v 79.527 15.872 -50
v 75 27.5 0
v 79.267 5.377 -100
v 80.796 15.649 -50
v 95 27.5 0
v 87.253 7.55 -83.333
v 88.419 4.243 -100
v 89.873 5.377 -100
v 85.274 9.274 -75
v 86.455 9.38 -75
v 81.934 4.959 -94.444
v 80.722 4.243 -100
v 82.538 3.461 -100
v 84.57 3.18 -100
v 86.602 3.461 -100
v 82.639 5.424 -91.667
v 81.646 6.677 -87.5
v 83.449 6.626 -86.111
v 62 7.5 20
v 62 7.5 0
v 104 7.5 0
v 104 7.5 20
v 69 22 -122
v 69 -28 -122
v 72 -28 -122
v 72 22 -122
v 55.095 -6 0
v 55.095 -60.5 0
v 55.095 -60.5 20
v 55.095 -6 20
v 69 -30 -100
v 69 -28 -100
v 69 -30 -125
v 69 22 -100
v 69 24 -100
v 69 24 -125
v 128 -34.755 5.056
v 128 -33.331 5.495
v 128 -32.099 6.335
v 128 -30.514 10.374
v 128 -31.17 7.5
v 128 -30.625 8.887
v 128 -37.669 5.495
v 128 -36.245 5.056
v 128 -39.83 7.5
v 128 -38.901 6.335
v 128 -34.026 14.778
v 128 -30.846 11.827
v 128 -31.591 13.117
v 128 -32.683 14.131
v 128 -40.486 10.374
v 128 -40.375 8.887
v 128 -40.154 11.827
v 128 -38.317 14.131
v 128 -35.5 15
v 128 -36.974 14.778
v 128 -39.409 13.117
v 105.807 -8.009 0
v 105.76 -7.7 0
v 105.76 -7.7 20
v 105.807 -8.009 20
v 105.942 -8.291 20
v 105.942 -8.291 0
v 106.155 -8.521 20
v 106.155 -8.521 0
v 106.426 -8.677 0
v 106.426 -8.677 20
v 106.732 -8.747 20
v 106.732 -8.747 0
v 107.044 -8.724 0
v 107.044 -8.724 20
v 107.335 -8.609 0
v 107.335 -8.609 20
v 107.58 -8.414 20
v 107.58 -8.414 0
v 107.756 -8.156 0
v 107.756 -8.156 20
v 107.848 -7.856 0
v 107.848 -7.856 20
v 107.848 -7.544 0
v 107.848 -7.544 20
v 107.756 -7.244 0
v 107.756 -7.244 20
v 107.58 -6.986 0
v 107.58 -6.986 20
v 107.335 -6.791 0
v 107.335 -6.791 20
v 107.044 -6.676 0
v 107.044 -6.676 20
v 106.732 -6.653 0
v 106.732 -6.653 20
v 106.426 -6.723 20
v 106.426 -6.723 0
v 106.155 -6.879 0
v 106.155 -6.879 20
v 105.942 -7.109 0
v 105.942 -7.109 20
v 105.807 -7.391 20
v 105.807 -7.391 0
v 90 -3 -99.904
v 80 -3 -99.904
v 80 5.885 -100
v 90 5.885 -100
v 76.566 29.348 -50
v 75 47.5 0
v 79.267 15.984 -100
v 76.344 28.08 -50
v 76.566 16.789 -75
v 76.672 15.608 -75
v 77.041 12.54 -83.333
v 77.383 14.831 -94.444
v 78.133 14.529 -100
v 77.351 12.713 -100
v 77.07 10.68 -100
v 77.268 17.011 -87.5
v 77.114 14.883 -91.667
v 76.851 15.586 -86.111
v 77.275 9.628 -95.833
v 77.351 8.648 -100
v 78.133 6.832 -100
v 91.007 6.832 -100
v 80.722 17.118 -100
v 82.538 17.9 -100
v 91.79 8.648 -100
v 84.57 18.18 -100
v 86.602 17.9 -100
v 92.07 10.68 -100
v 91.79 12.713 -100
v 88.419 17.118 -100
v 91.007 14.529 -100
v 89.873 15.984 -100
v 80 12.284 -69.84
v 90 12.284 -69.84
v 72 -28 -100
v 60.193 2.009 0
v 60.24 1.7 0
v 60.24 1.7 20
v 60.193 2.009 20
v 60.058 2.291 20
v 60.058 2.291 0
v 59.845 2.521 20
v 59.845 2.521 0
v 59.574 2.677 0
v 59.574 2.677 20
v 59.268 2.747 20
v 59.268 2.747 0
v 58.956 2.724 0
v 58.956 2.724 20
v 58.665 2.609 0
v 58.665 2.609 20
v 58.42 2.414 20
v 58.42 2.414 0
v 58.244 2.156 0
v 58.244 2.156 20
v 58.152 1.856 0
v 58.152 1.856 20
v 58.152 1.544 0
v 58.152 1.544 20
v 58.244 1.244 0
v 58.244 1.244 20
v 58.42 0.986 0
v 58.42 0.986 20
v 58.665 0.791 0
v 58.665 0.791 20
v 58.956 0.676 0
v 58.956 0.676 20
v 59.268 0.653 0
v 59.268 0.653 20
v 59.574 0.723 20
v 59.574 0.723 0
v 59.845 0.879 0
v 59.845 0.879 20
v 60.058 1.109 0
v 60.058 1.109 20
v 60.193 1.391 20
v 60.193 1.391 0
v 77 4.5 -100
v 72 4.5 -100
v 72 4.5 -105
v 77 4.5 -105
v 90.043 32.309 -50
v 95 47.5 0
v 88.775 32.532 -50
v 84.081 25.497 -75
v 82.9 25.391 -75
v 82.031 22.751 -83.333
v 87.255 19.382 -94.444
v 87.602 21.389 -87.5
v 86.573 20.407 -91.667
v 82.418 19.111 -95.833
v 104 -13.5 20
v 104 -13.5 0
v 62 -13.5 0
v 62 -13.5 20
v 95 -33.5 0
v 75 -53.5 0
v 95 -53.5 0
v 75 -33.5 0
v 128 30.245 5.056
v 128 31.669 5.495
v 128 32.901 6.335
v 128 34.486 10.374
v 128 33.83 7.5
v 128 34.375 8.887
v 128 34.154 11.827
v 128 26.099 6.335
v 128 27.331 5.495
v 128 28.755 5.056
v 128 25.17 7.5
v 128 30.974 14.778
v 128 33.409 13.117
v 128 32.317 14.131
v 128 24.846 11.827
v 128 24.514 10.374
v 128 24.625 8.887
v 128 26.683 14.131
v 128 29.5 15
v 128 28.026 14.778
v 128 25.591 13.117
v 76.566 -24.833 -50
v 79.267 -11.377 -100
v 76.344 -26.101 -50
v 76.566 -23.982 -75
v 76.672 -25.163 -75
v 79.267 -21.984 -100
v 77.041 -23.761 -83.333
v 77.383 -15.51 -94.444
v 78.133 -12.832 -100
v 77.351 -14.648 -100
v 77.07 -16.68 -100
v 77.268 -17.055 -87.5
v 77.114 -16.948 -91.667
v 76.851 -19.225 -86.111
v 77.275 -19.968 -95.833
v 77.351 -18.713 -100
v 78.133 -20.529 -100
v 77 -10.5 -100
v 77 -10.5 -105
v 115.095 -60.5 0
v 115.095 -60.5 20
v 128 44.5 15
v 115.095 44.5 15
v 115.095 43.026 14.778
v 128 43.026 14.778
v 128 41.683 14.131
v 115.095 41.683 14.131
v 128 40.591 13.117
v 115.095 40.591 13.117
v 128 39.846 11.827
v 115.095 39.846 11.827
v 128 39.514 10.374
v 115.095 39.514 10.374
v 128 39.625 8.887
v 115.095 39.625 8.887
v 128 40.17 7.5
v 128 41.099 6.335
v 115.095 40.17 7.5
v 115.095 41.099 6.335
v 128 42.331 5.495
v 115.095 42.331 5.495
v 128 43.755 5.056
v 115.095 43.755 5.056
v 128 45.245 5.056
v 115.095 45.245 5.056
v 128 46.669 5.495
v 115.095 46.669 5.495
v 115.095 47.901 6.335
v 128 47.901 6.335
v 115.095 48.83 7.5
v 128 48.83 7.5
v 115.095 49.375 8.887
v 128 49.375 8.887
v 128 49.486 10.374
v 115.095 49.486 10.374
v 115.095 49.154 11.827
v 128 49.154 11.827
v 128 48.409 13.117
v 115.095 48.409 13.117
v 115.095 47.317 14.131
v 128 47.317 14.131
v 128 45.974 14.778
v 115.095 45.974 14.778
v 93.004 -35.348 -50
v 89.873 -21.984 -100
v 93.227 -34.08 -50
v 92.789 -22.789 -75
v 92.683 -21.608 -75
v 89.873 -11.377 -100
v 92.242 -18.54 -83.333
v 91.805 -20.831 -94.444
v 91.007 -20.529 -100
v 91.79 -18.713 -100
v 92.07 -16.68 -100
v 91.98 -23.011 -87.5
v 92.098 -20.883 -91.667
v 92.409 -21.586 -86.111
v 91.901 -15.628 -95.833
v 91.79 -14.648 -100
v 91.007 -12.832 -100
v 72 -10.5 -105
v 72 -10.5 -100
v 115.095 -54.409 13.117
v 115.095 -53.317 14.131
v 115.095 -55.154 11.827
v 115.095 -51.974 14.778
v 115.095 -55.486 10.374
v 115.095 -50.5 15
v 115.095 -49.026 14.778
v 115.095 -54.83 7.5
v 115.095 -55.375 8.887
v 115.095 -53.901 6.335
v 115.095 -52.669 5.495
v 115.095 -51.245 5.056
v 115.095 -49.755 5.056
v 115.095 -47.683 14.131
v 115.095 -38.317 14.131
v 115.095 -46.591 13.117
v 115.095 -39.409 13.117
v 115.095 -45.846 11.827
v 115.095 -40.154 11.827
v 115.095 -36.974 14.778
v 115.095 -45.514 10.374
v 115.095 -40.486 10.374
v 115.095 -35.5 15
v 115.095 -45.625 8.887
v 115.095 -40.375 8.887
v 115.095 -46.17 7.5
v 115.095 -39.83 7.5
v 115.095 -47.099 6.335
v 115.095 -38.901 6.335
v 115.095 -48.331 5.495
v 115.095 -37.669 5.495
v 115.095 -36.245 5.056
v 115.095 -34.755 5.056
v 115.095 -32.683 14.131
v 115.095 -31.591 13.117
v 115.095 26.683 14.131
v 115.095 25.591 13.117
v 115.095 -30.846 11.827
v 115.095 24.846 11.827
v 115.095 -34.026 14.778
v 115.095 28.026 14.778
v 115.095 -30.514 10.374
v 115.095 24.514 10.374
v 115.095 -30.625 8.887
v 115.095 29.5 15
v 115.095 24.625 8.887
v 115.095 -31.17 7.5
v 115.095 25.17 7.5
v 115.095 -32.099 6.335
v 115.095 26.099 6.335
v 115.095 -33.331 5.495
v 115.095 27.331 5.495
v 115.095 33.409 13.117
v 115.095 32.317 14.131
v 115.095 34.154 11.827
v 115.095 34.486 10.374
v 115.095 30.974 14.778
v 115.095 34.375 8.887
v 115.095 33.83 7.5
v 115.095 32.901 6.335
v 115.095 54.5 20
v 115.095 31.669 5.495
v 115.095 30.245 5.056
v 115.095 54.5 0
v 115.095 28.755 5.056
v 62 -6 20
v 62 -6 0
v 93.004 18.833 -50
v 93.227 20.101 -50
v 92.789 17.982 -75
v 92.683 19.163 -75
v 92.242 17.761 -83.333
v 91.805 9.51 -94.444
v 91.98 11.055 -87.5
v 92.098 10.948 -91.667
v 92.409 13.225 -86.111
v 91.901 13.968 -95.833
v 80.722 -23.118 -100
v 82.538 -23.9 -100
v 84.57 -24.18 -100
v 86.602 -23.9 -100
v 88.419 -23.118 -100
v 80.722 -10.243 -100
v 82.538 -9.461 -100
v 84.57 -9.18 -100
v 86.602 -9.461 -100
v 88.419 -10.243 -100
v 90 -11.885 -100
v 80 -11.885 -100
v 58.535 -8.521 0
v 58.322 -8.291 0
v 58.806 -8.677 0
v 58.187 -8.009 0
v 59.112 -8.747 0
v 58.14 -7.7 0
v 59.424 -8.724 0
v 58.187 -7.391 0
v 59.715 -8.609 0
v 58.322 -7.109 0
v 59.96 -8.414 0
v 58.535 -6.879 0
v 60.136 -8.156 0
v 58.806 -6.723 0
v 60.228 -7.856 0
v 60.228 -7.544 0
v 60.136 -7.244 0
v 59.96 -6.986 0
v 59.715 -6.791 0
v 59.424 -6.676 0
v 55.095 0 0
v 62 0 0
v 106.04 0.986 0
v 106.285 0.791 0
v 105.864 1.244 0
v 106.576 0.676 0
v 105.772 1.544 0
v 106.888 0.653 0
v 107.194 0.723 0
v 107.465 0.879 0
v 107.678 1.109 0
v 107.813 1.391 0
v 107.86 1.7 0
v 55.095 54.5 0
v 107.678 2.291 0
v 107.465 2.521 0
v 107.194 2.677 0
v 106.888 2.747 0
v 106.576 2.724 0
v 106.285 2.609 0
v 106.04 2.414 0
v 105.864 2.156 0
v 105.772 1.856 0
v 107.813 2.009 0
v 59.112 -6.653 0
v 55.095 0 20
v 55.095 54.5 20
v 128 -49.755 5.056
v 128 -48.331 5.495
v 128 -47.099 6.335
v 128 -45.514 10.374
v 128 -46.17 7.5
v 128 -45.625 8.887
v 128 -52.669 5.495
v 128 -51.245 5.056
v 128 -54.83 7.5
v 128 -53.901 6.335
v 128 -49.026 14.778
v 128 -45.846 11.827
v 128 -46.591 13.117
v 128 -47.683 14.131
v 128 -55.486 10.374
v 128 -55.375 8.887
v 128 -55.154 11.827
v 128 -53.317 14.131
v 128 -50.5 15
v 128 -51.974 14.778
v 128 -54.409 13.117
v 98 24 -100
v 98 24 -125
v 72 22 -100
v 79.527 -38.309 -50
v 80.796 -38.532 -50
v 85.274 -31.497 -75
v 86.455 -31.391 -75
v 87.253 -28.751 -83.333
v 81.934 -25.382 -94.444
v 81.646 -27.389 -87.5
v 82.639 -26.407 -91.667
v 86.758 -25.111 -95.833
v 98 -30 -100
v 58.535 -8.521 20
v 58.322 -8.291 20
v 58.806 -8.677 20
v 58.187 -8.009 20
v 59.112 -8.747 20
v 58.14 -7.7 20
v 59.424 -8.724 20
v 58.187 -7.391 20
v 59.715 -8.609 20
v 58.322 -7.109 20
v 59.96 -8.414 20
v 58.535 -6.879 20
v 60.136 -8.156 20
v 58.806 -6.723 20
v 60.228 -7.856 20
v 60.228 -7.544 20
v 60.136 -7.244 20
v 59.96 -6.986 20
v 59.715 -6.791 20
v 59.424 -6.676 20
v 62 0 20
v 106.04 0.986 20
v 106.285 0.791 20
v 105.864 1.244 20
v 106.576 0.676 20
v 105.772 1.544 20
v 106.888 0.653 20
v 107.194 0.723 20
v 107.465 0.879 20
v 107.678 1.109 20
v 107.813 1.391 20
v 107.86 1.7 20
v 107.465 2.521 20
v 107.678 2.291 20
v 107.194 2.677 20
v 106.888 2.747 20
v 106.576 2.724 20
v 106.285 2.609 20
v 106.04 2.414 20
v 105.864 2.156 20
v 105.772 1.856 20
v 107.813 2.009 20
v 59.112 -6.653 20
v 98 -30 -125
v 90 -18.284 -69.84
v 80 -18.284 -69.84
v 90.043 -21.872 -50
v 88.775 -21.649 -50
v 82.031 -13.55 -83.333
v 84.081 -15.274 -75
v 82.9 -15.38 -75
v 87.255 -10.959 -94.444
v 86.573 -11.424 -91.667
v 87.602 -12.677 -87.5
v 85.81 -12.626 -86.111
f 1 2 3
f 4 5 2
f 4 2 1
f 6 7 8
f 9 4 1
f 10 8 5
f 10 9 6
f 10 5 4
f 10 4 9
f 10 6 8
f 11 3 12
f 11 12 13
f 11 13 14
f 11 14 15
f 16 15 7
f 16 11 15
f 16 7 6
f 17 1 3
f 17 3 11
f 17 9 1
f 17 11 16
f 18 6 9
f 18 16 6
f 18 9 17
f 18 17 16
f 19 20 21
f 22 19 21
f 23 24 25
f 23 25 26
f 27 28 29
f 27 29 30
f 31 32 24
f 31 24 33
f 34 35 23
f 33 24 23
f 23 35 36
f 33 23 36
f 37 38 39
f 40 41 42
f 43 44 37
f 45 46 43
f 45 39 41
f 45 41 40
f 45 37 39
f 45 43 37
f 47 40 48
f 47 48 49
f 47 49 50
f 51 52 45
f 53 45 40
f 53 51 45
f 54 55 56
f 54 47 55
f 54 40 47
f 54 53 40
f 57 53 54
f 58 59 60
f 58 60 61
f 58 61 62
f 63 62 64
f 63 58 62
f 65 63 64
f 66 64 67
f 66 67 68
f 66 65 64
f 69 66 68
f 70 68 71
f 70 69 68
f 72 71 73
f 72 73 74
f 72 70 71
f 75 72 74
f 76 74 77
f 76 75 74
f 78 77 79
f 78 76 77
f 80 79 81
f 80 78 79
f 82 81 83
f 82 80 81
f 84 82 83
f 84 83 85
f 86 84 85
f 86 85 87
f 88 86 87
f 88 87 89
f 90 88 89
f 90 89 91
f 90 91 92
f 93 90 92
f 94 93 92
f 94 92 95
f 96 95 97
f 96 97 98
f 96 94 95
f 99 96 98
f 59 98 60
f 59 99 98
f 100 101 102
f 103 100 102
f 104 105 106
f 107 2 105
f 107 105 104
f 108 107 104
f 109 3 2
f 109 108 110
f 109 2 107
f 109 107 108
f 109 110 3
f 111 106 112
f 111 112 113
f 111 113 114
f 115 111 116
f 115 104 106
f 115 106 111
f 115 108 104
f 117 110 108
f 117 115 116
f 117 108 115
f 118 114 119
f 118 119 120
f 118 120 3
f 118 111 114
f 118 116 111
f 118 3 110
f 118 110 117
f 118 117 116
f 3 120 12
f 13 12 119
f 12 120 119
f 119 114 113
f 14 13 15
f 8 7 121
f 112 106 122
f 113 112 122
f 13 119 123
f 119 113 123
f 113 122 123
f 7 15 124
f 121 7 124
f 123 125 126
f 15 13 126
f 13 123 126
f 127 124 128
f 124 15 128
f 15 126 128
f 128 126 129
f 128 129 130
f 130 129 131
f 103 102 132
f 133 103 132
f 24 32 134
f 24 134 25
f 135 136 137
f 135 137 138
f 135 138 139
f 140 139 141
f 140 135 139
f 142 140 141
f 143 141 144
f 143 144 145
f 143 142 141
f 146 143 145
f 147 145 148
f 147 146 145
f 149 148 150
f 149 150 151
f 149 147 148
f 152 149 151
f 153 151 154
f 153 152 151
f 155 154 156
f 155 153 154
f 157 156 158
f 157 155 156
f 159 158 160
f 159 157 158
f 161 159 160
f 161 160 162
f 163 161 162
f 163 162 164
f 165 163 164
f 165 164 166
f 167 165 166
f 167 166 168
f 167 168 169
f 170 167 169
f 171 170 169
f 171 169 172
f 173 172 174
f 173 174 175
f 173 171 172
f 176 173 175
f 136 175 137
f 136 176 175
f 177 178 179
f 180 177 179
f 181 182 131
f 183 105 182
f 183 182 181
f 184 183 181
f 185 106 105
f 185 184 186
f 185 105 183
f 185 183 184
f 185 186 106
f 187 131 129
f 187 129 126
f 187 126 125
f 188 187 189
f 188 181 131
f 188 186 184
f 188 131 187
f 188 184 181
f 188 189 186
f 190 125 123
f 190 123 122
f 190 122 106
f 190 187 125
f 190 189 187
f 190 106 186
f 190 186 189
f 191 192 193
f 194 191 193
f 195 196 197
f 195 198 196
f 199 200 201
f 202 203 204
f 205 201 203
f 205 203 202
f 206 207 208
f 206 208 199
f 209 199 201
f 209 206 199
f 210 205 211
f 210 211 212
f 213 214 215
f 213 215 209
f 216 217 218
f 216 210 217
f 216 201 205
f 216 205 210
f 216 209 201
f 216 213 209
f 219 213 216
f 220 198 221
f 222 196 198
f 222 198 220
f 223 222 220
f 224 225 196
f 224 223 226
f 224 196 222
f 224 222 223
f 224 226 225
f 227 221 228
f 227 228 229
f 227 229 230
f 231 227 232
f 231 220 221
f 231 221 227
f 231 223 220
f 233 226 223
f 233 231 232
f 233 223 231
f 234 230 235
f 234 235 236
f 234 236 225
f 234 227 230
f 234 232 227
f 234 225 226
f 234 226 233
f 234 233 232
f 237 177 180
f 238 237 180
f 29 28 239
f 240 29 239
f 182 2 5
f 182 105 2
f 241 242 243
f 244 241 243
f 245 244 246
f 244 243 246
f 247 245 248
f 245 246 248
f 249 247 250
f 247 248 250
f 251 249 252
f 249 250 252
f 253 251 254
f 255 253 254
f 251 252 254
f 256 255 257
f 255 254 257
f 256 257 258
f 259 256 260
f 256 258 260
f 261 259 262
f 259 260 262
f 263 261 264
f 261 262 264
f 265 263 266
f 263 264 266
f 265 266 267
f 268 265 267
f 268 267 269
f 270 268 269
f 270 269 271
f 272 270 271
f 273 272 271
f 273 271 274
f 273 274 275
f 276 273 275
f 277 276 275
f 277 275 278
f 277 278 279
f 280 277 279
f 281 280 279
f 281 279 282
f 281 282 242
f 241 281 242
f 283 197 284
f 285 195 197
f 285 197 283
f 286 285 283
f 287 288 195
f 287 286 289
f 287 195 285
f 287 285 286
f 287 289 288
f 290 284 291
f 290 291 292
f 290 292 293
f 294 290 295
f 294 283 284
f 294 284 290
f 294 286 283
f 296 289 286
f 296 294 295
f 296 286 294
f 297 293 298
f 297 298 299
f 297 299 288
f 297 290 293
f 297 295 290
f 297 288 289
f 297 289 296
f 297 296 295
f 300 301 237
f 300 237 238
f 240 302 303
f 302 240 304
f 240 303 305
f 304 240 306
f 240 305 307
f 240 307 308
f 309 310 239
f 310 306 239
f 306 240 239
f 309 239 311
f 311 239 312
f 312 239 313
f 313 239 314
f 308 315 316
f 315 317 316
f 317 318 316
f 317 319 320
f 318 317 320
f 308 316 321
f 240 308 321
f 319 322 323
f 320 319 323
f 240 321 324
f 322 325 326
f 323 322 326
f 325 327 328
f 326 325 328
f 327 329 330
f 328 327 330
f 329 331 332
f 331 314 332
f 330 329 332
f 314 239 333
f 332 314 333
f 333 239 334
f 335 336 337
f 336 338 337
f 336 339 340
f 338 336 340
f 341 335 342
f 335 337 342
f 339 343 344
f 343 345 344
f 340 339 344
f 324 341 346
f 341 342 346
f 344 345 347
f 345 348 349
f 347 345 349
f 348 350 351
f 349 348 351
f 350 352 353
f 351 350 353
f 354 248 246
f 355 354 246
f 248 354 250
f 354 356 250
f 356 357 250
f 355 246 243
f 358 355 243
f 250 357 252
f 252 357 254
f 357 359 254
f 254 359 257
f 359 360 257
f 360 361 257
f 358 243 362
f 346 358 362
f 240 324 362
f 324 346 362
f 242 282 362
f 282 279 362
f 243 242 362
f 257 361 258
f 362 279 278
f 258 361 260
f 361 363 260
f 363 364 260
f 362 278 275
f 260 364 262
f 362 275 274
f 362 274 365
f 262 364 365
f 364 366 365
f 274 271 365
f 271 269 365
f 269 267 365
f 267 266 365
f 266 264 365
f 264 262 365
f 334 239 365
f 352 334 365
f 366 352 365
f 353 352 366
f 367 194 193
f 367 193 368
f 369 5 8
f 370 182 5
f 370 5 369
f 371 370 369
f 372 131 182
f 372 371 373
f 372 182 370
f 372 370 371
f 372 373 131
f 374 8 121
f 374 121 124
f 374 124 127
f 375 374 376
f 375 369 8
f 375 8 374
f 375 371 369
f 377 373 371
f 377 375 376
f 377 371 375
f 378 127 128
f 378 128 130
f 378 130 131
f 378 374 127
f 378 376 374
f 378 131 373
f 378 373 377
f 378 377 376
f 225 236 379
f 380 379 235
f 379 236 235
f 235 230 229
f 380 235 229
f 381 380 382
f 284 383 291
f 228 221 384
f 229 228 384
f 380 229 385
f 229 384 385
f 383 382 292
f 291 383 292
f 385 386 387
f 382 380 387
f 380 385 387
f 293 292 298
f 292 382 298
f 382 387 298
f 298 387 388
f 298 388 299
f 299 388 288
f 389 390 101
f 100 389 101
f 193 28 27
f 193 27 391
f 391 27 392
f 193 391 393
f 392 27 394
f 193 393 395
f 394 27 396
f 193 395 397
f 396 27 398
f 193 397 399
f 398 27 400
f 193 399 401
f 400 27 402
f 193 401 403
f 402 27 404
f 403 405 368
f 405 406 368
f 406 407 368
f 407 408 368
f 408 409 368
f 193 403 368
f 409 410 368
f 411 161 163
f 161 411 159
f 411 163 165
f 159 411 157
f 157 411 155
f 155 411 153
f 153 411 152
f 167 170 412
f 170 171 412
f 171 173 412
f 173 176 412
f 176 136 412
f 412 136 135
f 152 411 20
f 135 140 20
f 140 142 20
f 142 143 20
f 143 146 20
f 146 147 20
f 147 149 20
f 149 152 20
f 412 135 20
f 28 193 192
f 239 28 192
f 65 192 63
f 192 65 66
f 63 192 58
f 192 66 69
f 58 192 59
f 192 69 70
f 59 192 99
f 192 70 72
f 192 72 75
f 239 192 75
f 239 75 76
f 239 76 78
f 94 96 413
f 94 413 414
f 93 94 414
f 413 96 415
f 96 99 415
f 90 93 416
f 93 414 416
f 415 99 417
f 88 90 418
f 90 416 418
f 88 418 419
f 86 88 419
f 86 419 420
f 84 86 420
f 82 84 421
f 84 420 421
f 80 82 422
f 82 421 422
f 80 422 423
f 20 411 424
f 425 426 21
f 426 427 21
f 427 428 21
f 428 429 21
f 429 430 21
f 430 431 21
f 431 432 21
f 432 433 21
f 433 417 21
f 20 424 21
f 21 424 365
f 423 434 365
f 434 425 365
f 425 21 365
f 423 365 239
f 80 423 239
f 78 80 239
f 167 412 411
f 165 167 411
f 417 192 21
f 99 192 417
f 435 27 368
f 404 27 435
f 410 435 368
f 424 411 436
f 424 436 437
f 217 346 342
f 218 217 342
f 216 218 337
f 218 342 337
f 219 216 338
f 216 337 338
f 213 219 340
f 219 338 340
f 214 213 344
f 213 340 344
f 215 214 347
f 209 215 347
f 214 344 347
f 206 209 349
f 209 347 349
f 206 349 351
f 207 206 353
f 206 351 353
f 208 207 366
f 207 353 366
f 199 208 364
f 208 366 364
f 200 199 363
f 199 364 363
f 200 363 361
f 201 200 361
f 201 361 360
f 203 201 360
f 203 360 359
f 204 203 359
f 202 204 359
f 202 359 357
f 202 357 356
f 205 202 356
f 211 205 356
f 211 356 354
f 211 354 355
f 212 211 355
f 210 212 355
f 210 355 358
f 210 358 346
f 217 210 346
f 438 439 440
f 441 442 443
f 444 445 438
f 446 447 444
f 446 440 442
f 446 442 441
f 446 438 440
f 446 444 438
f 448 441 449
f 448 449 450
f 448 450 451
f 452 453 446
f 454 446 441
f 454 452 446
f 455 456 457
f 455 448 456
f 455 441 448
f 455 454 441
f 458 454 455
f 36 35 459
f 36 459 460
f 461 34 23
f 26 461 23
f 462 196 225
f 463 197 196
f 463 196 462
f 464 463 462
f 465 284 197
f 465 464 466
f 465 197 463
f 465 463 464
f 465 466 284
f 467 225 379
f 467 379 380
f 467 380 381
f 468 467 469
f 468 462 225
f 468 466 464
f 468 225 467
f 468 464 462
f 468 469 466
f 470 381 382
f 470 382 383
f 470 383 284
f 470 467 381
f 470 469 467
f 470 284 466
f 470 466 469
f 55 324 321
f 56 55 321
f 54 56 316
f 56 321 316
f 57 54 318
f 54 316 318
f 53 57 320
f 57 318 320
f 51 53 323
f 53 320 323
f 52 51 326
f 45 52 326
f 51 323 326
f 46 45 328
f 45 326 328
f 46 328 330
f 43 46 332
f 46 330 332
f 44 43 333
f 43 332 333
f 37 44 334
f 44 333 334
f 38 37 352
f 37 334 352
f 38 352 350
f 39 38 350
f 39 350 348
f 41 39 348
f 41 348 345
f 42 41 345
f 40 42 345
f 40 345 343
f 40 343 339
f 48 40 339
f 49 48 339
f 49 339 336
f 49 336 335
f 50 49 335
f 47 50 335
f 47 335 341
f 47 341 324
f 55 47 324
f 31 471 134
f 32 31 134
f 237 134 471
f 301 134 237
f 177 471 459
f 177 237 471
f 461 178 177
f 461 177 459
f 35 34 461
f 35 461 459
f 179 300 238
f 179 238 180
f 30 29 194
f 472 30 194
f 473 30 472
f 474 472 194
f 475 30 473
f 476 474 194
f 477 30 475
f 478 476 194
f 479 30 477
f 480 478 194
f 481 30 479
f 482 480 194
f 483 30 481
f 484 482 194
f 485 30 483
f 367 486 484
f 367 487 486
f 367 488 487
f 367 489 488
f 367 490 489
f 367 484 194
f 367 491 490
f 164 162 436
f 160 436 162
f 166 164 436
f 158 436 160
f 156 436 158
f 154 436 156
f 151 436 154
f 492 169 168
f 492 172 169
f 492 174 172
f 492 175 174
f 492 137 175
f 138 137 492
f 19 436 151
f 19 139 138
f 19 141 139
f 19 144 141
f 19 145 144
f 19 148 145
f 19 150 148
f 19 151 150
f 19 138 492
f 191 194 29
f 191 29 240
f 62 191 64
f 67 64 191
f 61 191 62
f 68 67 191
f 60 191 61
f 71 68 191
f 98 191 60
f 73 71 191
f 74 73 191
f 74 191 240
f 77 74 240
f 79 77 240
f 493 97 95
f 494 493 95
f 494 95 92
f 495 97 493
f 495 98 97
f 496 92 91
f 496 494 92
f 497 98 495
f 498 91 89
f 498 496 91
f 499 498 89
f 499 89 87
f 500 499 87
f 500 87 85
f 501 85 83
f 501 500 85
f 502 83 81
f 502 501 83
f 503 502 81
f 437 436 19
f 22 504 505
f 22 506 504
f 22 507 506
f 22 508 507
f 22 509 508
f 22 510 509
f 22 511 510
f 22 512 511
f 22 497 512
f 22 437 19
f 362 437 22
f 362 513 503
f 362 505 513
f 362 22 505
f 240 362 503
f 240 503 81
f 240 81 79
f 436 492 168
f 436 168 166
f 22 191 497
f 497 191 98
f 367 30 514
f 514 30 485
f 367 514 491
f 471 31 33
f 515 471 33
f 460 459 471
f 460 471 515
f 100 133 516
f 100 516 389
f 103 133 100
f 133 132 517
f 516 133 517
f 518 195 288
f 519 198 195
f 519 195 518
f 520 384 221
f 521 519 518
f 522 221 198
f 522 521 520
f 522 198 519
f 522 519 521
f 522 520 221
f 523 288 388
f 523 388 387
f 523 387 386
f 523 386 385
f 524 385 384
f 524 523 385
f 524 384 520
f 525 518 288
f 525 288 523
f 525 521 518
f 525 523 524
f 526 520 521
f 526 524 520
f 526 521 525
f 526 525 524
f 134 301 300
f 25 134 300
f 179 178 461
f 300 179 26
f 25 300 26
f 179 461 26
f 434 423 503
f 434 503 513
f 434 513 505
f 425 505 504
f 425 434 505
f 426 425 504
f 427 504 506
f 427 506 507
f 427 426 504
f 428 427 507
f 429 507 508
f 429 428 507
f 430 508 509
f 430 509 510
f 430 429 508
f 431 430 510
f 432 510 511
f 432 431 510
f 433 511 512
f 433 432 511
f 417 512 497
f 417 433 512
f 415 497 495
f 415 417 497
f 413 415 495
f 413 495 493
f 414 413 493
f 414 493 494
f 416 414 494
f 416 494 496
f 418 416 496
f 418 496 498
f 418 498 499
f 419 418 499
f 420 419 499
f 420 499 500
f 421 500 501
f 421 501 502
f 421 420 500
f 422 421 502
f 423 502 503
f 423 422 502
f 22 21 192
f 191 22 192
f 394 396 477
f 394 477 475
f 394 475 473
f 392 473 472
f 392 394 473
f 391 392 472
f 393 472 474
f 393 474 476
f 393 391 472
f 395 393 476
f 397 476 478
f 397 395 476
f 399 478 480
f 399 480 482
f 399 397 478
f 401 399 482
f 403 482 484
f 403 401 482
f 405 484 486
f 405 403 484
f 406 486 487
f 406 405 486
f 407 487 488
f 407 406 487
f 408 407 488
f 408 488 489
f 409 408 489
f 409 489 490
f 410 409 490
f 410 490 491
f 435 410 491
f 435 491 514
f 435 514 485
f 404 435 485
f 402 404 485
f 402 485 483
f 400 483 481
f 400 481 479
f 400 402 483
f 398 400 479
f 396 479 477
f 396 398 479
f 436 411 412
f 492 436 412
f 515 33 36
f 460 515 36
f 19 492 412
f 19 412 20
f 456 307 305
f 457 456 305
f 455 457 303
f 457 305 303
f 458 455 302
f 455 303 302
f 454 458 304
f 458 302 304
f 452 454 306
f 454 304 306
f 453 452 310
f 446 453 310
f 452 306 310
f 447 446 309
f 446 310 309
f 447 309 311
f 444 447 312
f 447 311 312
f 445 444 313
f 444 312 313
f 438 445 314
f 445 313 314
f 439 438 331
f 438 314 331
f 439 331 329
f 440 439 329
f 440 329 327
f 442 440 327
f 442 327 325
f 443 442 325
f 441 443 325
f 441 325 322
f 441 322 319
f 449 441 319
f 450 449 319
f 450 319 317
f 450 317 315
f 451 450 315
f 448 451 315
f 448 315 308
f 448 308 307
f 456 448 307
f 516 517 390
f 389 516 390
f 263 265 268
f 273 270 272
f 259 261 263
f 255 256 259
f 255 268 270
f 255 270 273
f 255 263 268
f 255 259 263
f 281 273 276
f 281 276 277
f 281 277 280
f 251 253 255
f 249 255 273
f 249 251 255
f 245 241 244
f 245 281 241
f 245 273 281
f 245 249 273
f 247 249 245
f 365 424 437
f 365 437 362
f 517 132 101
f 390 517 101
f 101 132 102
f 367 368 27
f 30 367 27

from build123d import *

# Parameters (mm, degrees)
SKETCH_5_W            = 60
SKETCH_5_H            = 115
EXTRUDE_2_DEPTH       = 20
SKETCH_1_R            = 1.05
CUT_EXTRUDE_4_DEPTH   = 20
SKETCH_6_R            = 5
EXTRUDE_3_DEPTH       = 13
EXTRUDE_6_DEPTH       = 3
EXTRUDE_6_DEPTH_BACK  = 26
SKETCH_13_W           = 25
SKETCH_13_H           = 54
SKETCH_16_W           = 22
SKETCH_16_H           = 50
CUT_EXTRUDE_9_DEPTH   = 3
SKETCH_17_W           = 5
SKETCH_17_H           = 15
CUT_EXTRUDE_10_DEPTH  = 8
EXTRUDE_13_DEPTH      = 5
EXTRUDE_13_DEPTH_BACK = 5


with BuildPart() as part:
    # 草圖5 → 填料-伸長2 (new body)
    with BuildSketch(Plane.XY):
        with Locations((85.095319229, -3)):
            Rectangle(SKETCH_5_W, SKETCH_5_H)
    extrude(amount=EXTRUDE_2_DEPTH)

    # 草圖1 → 除料-伸長4 (cut)
    with BuildSketch(Plane.XY):
        with Locations((59.19, 1.7)):
            Circle(SKETCH_1_R)
        with Locations((106.81, 1.7)):
            Circle(SKETCH_1_R)
        with Locations(Location((106.81, -7.7, 0), (0, 0, 180))):
            Circle(SKETCH_1_R)
        with Locations(Location((59.19, -7.7, 0), (0, 0, 180))):
            Circle(SKETCH_1_R)
        Polygon((55, -3), (55, 0), (62, 0), (62, 7.5), (104, 7.5), (104, -13.5), (62, -13.5), (62, -6), (55, -6), align=None)
    extrude(amount=CUT_EXTRUDE_4_DEPTH, mode=Mode.SUBTRACT)

    # 草圖6 → 填料-伸長3 (add)
    with BuildSketch(Plane(origin=(115, 0, 0), x_dir=(0, 0, -1), z_dir=(1, 0, 0))):
        with Locations(Location((-10, 44.5, 0), (0, 0, 180))):
            Circle(SKETCH_6_R)
        with Locations(Location((-10, 29.5, 0), (0, 0, 180))):
            Circle(SKETCH_6_R)
        with Locations(Location((-10, -35.5, 0), (0, 0, 180))):
            Circle(SKETCH_6_R)
        with Locations(Location((-10, -50.5, 0), (0, 0, 180))):
            Circle(SKETCH_6_R)
    extrude(amount=EXTRUDE_3_DEPTH)


with BuildPart() as body_2:
    # 草圖13 → 填料-伸長6 (new, two sides: drawn at the far end of the back side and taken through both)
    with BuildSketch(Plane(origin=(95, 0, 0), x_dir=(0, 0, -1), z_dir=(1, 0, 0)).offset(-EXTRUDE_6_DEPTH_BACK)):
        with Locations((112.5, -3)):
            Rectangle(SKETCH_13_W, SKETCH_13_H)
    extrude(amount=EXTRUDE_6_DEPTH + EXTRUDE_6_DEPTH_BACK)

    # 草圖16 → 除料-伸長9 (cut)
    with BuildSketch(Plane(origin=(69, 0, 0), x_dir=(0, 0, -1), z_dir=(1, 0, 0))):
        with Locations((111, -3)):
            Rectangle(SKETCH_16_W, SKETCH_16_H)
    extrude(amount=CUT_EXTRUDE_9_DEPTH, mode=Mode.SUBTRACT)

    # 草圖17 → 除料-伸長10 (cut)
    with BuildSketch(Plane(origin=(69, 0, 0), x_dir=(0, 0, -1), z_dir=(1, 0, 0))):
        with Locations((102.5, -3)):
            Rectangle(SKETCH_17_W, SKETCH_17_H)
    extrude(amount=CUT_EXTRUDE_10_DEPTH, mode=Mode.SUBTRACT)


with BuildPart() as body_3:
    # 草圖21 → 填料-伸長13 (new, two sides: drawn at the far end of the back side and taken through both)
    with BuildSketch(Plane(origin=(85, 0, 0), x_dir=(0, 0, -1), z_dir=(1, 0, 0)).offset(-EXTRUDE_13_DEPTH_BACK)):
        Polygon((69.839876567, 12.283695651), (69.839876567, -18.283695651), (100, -11.88497246), (99.903514788, -3), (100, 5.88497246), align=None)
    extrude(amount=EXTRUDE_13_DEPTH + EXTRUDE_13_DEPTH_BACK)


with BuildPart() as body_4:
    # Knit 1: read off the stored shape, not the designer's step
    # Knit 1: loft between two sections, ruled curve by curve
    knit_1_from = [
        Edge.make_bspline([(79.266895317, 5.377196179, -100), (79.579395317, 5.064696179, -100), (79.931362244, 4.768290315, -100), (80.709511323, 4.233165726, -100), (81.135733214, 3.994620259, -100), (82.046998926, 3.600245646, -100), (82.531971403, 3.444609801, -100), (83.534778832, 3.234670337, -100), (84.052429223, 3.180497037, -100), (85.087963129, 3.180497037, -100), (85.60561352, 3.234670337, -100), (86.608420949, 3.444609801, -100), (87.093393426, 3.600245646, -100), (88.004659138, 3.994620259, -100), (88.430881029, 4.233165726, -100), (89.209030109, 4.768290315, -100), (89.560997035, 5.064696179, -100), (89.873497035, 5.377196179, -100)], [0, 0, 0, 0, 0.125, 0.125, 0.25, 0.25, 0.375, 0.375, 0.5, 0.5, 0.625, 0.625, 0.75, 0.75, 0.875, 0.875, 1, 1, 1, 1], 3),
        Edge.make_bspline([(89.873497035, 5.377196179, -100), (90.185997035, 5.689696179, -100), (90.482402899, 6.041663105, -100), (91.017527488, 6.819812184, -100), (91.256072955, 7.246034075, -100), (91.650447568, 8.157299787, -100), (91.806083413, 8.642272265, -100), (92.016022877, 9.645079694, -100), (92.070196176, 10.162730084, -100), (92.070196176, 11.19826399, -100), (92.016022877, 11.715914381, -100), (91.806083413, 12.71872181, -100), (91.650447568, 13.203694288, -100), (91.256072955, 14.11496, -100), (91.017527488, 14.541181891, -100), (90.482402899, 15.31933097, -100), (90.185997035, 15.671297896, -100), (89.873497035, 15.983797896, -100)], [0, 0, 0, 0, 0.125, 0.125, 0.25, 0.25, 0.375, 0.375, 0.5, 0.5, 0.625, 0.625, 0.75, 0.75, 0.875, 0.875, 1, 1, 1, 1], 3),
        Edge.make_bspline([(79.266895317, 15.983797896, -100), (78.954395317, 15.671297896, -100), (78.657989454, 15.31933097, -100), (78.122864864, 14.541181891, -100), (77.884319398, 14.11496, -100), (77.489944785, 13.203694288, -100), (77.334308939, 12.71872181, -100), (77.124369476, 11.715914381, -100), (77.070196176, 11.19826399, -100), (77.070196176, 10.162730084, -100), (77.124369476, 9.645079694, -100), (77.334308939, 8.642272265, -100), (77.489944785, 8.157299787, -100), (77.884319398, 7.246034075, -100), (78.122864864, 6.819812184, -100), (78.657989454, 6.041663105, -100), (78.954395317, 5.689696179, -100), (79.266895317, 5.377196179, -100)], [0, 0, 0, 0, 0.125, 0.125, 0.25, 0.25, 0.375, 0.375, 0.5, 0.5, 0.625, 0.625, 0.75, 0.75, 0.875, 0.875, 1, 1, 1, 1], 3),
        Edge.make_bspline([(89.873497035, 15.983797896, -100), (89.560997035, 16.296297896, -100), (89.209030109, 16.59270376, -100), (88.430881029, 17.127828349, -100), (88.004659138, 17.366373816, -100), (87.093393426, 17.760748429, -100), (86.608420949, 17.916384274, -100), (85.60561352, 18.126323738, -100), (85.087963129, 18.180497037, -100), (84.052429223, 18.180497037, -100), (83.534778832, 18.126323738, -100), (82.531971403, 17.916384274, -100), (82.046998926, 17.760748429, -100), (81.135733214, 17.366373816, -100), (80.709511323, 17.127828349, -100), (79.931362244, 16.59270376, -100), (79.579395317, 16.296297896, -100), (79.266895317, 15.983797896, -100)], [0, 0, 0, 0, 0.125, 0.125, 0.25, 0.25, 0.375, 0.375, 0.5, 0.5, 0.625, 0.625, 0.75, 0.75, 0.875, 0.875, 1, 1, 1, 1], 3),
    ]
    knit_1_to = [
        Edge.make_bspline([(75, 27.5, 0), (75.833333333, 27.5, 0), (76.666666667, 27.5, 0), (78.333333333, 27.5, 0), (79.166666667, 27.5, 0), (80.833333333, 27.5, 0), (81.666666667, 27.5, 0), (83.333333333, 27.5, 0), (84.166666667, 27.5, 0), (85.833333333, 27.5, 0), (86.666666667, 27.5, 0), (88.333333333, 27.5, 0), (89.166666667, 27.5, 0), (90.833333333, 27.5, 0), (91.666666667, 27.5, 0), (93.333333333, 27.5, 0), (94.166666667, 27.5, 0), (95, 27.5, 0)], [0, 0, 0, 0, 0.125, 0.125, 0.25, 0.25, 0.375, 0.375, 0.5, 0.5, 0.625, 0.625, 0.75, 0.75, 0.875, 0.875, 1, 1, 1, 1], 3),
        Edge.make_bspline([(95, 27.5, 0), (95, 28.333333333, 0), (95, 29.166666667, 0), (95, 30.833333333, 0), (95, 31.666666667, 0), (95, 33.333333333, 0), (95, 34.166666667, 0), (95, 35.833333333, 0), (95, 36.666666667, 0), (95, 38.333333333, 0), (95, 39.166666667, 0), (95, 40.833333333, 0), (95, 41.666666667, 0), (95, 43.333333333, 0), (95, 44.166666667, 0), (95, 45.833333333, 0), (95, 46.666666667, 0), (95, 47.5, 0)], [0, 0, 0, 0, 0.125, 0.125, 0.25, 0.25, 0.375, 0.375, 0.5, 0.5, 0.625, 0.625, 0.75, 0.75, 0.875, 0.875, 1, 1, 1, 1], 3),
        Edge.make_bspline([(75, 47.5, 0), (75, 46.666666667, 0), (75, 45.833333333, 0), (75, 44.166666667, 0), (75, 43.333333333, 0), (75, 41.666666667, 0), (75, 40.833333333, 0), (75, 39.166666667, 0), (75, 38.333333333, 0), (75, 36.666666667, 0), (75, 35.833333333, 0), (75, 34.166666667, 0), (75, 33.333333333, 0), (75, 31.666666667, 0), (75, 30.833333333, 0), (75, 29.166666667, 0), (75, 28.333333333, 0), (75, 27.5, 0)], [0, 0, 0, 0, 0.125, 0.125, 0.25, 0.25, 0.375, 0.375, 0.5, 0.5, 0.625, 0.625, 0.75, 0.75, 0.875, 0.875, 1, 1, 1, 1], 3),
        Edge.make_bspline([(95, 47.5, 0), (94.166666667, 47.5, 0), (93.333333333, 47.5, 0), (91.666666667, 47.5, 0), (90.833333333, 47.5, 0), (89.166666667, 47.5, 0), (88.333333333, 47.5, 0), (86.666666667, 47.5, 0), (85.833333333, 47.5, 0), (84.166666667, 47.5, 0), (83.333333333, 47.5, 0), (81.666666667, 47.5, 0), (80.833333333, 47.5, 0), (79.166666667, 47.5, 0), (78.333333333, 47.5, 0), (76.666666667, 47.5, 0), (75.833333333, 47.5, 0), (75, 47.5, 0)], [0, 0, 0, 0, 0.125, 0.125, 0.25, 0.25, 0.375, 0.375, 0.5, 0.5, 0.625, 0.625, 0.75, 0.75, 0.875, 0.875, 1, 1, 1, 1], 3),
    ]
    knit_1 = Solid(Shell([*[Face.make_surface_from_curves(knit_1_from[k], knit_1_to[k]) for k in range(4)], Face(Wire(knit_1_from)), Face(Wire(knit_1_to))]))
    add(knit_1)


with BuildPart() as body_5:
    # Knit 2: read off the stored shape, not the designer's step
    # Knit 2: loft between two sections, ruled curve by curve
    knit_2_from = [
        Edge.make_bspline([(79.266895317, -21.983797896, -100), (79.579395317, -22.296297896, -100), (79.931362244, -22.59270376, -100), (80.709511323, -23.127828349, -100), (81.135733214, -23.366373816, -100), (82.046998926, -23.760748429, -100), (82.531971403, -23.916384274, -100), (83.534778832, -24.126323738, -100), (84.052429223, -24.180497037, -100), (85.087963129, -24.180497037, -100), (85.60561352, -24.126323738, -100), (86.608420949, -23.916384274, -100), (87.093393426, -23.760748429, -100), (88.004659138, -23.366373816, -100), (88.430881029, -23.127828349, -100), (89.209030109, -22.59270376, -100), (89.560997035, -22.296297896, -100), (89.873497035, -21.983797896, -100)], [0, 0, 0, 0, 0.125, 0.125, 0.25, 0.25, 0.375, 0.375, 0.5, 0.5, 0.625, 0.625, 0.75, 0.75, 0.875, 0.875, 1, 1, 1, 1], 3),
        Edge.make_bspline([(89.873497035, -21.983797896, -100), (90.185997035, -21.671297896, -100), (90.482402899, -21.31933097, -100), (91.017527488, -20.541181891, -100), (91.256072955, -20.11496, -100), (91.650447568, -19.203694288, -100), (91.806083413, -18.71872181, -100), (92.016022877, -17.715914381, -100), (92.070196176, -17.19826399, -100), (92.070196176, -16.162730084, -100), (92.016022877, -15.645079694, -100), (91.806083413, -14.642272265, -100), (91.650447568, -14.157299787, -100), (91.256072955, -13.246034075, -100), (91.017527488, -12.819812184, -100), (90.482402899, -12.041663105, -100), (90.185997035, -11.689696179, -100), (89.873497035, -11.377196179, -100)], [0, 0, 0, 0, 0.125, 0.125, 0.25, 0.25, 0.375, 0.375, 0.5, 0.5, 0.625, 0.625, 0.75, 0.75, 0.875, 0.875, 1, 1, 1, 1], 3),
        Edge.make_bspline([(79.266895317, -11.377196179, -100), (78.954395317, -11.689696179, -100), (78.657989454, -12.041663105, -100), (78.122864864, -12.819812184, -100), (77.884319398, -13.246034075, -100), (77.489944785, -14.157299787, -100), (77.334308939, -14.642272265, -100), (77.124369476, -15.645079694, -100), (77.070196176, -16.162730084, -100), (77.070196176, -17.19826399, -100), (77.124369476, -17.715914381, -100), (77.334308939, -18.71872181, -100), (77.489944785, -19.203694288, -100), (77.884319398, -20.11496, -100), (78.122864864, -20.541181891, -100), (78.657989454, -21.31933097, -100), (78.954395317, -21.671297896, -100), (79.266895317, -21.983797896, -100)], [0, 0, 0, 0, 0.125, 0.125, 0.25, 0.25, 0.375, 0.375, 0.5, 0.5, 0.625, 0.625, 0.75, 0.75, 0.875, 0.875, 1, 1, 1, 1], 3),
        Edge.make_bspline([(89.873497035, -11.377196179, -100), (89.560997035, -11.064696179, -100), (89.209030109, -10.768290315, -100), (88.430881029, -10.233165726, -100), (88.004659138, -9.994620259, -100), (87.093393426, -9.600245646, -100), (86.608420949, -9.444609801, -100), (85.60561352, -9.234670337, -100), (85.087963129, -9.180497037, -100), (84.052429223, -9.180497037, -100), (83.534778832, -9.234670337, -100), (82.531971403, -9.444609801, -100), (82.046998926, -9.600245646, -100), (81.135733214, -9.994620259, -100), (80.709511323, -10.233165726, -100), (79.931362244, -10.768290315, -100), (79.579395317, -11.064696179, -100), (79.266895317, -11.377196179, -100)], [0, 0, 0, 0, 0.125, 0.125, 0.25, 0.25, 0.375, 0.375, 0.5, 0.5, 0.625, 0.625, 0.75, 0.75, 0.875, 0.875, 1, 1, 1, 1], 3),
    ]
    knit_2_to = [
        Edge.make_bspline([(75, -53.5, 0), (75.833333333, -53.5, 0), (76.666666667, -53.5, 0), (78.333333333, -53.5, 0), (79.166666667, -53.5, 0), (80.833333333, -53.5, 0), (81.666666667, -53.5, 0), (83.333333333, -53.5, 0), (84.166666667, -53.5, 0), (85.833333333, -53.5, 0), (86.666666667, -53.5, 0), (88.333333333, -53.5, 0), (89.166666667, -53.5, 0), (90.833333333, -53.5, 0), (91.666666667, -53.5, 0), (93.333333333, -53.5, 0), (94.166666667, -53.5, 0), (95, -53.5, 0)], [0, 0, 0, 0, 0.125, 0.125, 0.25, 0.25, 0.375, 0.375, 0.5, 0.5, 0.625, 0.625, 0.75, 0.75, 0.875, 0.875, 1, 1, 1, 1], 3),
        Edge.make_bspline([(95, -53.5, 0), (95, -52.666666667, 0), (95, -51.833333333, 0), (95, -50.166666667, 0), (95, -49.333333333, 0), (95, -47.666666667, 0), (95, -46.833333333, 0), (95, -45.166666667, 0), (95, -44.333333333, 0), (95, -42.666666667, 0), (95, -41.833333333, 0), (95, -40.166666667, 0), (95, -39.333333333, 0), (95, -37.666666667, 0), (95, -36.833333333, 0), (95, -35.166666667, 0), (95, -34.333333333, 0), (95, -33.5, 0)], [0, 0, 0, 0, 0.125, 0.125, 0.25, 0.25, 0.375, 0.375, 0.5, 0.5, 0.625, 0.625, 0.75, 0.75, 0.875, 0.875, 1, 1, 1, 1], 3),
        Edge.make_bspline([(75, -33.5, 0), (75, -34.333333333, 0), (75, -35.166666667, 0), (75, -36.833333333, 0), (75, -37.666666667, 0), (75, -39.333333333, 0), (75, -40.166666667, 0), (75, -41.833333333, 0), (75, -42.666666667, 0), (75, -44.333333333, 0), (75, -45.166666667, 0), (75, -46.833333333, 0), (75, -47.666666667, 0), (75, -49.333333333, 0), (75, -50.166666667, 0), (75, -51.833333333, 0), (75, -52.666666667, 0), (75, -53.5, 0)], [0, 0, 0, 0, 0.125, 0.125, 0.25, 0.25, 0.375, 0.375, 0.5, 0.5, 0.625, 0.625, 0.75, 0.75, 0.875, 0.875, 1, 1, 1, 1], 3),
        Edge.make_bspline([(95, -33.5, 0), (94.166666667, -33.5, 0), (93.333333333, -33.5, 0), (91.666666667, -33.5, 0), (90.833333333, -33.5, 0), (89.166666667, -33.5, 0), (88.333333333, -33.5, 0), (86.666666667, -33.5, 0), (85.833333333, -33.5, 0), (84.166666667, -33.5, 0), (83.333333333, -33.5, 0), (81.666666667, -33.5, 0), (80.833333333, -33.5, 0), (79.166666667, -33.5, 0), (78.333333333, -33.5, 0), (76.666666667, -33.5, 0), (75.833333333, -33.5, 0), (75, -33.5, 0)], [0, 0, 0, 0, 0.125, 0.125, 0.25, 0.25, 0.375, 0.375, 0.5, 0.5, 0.625, 0.625, 0.75, 0.75, 0.875, 0.875, 1, 1, 1, 1], 3),
    ]
    knit_2 = Solid(Shell([*[Face.make_surface_from_curves(knit_2_from[k], knit_2_to[k]) for k in range(4)], Face(Wire(knit_2_from)), Face(Wire(knit_2_to))]))
    add(knit_2)


solid = Compound([part.part, body_2.part, body_3.part, body_4.part, body_5.part])
